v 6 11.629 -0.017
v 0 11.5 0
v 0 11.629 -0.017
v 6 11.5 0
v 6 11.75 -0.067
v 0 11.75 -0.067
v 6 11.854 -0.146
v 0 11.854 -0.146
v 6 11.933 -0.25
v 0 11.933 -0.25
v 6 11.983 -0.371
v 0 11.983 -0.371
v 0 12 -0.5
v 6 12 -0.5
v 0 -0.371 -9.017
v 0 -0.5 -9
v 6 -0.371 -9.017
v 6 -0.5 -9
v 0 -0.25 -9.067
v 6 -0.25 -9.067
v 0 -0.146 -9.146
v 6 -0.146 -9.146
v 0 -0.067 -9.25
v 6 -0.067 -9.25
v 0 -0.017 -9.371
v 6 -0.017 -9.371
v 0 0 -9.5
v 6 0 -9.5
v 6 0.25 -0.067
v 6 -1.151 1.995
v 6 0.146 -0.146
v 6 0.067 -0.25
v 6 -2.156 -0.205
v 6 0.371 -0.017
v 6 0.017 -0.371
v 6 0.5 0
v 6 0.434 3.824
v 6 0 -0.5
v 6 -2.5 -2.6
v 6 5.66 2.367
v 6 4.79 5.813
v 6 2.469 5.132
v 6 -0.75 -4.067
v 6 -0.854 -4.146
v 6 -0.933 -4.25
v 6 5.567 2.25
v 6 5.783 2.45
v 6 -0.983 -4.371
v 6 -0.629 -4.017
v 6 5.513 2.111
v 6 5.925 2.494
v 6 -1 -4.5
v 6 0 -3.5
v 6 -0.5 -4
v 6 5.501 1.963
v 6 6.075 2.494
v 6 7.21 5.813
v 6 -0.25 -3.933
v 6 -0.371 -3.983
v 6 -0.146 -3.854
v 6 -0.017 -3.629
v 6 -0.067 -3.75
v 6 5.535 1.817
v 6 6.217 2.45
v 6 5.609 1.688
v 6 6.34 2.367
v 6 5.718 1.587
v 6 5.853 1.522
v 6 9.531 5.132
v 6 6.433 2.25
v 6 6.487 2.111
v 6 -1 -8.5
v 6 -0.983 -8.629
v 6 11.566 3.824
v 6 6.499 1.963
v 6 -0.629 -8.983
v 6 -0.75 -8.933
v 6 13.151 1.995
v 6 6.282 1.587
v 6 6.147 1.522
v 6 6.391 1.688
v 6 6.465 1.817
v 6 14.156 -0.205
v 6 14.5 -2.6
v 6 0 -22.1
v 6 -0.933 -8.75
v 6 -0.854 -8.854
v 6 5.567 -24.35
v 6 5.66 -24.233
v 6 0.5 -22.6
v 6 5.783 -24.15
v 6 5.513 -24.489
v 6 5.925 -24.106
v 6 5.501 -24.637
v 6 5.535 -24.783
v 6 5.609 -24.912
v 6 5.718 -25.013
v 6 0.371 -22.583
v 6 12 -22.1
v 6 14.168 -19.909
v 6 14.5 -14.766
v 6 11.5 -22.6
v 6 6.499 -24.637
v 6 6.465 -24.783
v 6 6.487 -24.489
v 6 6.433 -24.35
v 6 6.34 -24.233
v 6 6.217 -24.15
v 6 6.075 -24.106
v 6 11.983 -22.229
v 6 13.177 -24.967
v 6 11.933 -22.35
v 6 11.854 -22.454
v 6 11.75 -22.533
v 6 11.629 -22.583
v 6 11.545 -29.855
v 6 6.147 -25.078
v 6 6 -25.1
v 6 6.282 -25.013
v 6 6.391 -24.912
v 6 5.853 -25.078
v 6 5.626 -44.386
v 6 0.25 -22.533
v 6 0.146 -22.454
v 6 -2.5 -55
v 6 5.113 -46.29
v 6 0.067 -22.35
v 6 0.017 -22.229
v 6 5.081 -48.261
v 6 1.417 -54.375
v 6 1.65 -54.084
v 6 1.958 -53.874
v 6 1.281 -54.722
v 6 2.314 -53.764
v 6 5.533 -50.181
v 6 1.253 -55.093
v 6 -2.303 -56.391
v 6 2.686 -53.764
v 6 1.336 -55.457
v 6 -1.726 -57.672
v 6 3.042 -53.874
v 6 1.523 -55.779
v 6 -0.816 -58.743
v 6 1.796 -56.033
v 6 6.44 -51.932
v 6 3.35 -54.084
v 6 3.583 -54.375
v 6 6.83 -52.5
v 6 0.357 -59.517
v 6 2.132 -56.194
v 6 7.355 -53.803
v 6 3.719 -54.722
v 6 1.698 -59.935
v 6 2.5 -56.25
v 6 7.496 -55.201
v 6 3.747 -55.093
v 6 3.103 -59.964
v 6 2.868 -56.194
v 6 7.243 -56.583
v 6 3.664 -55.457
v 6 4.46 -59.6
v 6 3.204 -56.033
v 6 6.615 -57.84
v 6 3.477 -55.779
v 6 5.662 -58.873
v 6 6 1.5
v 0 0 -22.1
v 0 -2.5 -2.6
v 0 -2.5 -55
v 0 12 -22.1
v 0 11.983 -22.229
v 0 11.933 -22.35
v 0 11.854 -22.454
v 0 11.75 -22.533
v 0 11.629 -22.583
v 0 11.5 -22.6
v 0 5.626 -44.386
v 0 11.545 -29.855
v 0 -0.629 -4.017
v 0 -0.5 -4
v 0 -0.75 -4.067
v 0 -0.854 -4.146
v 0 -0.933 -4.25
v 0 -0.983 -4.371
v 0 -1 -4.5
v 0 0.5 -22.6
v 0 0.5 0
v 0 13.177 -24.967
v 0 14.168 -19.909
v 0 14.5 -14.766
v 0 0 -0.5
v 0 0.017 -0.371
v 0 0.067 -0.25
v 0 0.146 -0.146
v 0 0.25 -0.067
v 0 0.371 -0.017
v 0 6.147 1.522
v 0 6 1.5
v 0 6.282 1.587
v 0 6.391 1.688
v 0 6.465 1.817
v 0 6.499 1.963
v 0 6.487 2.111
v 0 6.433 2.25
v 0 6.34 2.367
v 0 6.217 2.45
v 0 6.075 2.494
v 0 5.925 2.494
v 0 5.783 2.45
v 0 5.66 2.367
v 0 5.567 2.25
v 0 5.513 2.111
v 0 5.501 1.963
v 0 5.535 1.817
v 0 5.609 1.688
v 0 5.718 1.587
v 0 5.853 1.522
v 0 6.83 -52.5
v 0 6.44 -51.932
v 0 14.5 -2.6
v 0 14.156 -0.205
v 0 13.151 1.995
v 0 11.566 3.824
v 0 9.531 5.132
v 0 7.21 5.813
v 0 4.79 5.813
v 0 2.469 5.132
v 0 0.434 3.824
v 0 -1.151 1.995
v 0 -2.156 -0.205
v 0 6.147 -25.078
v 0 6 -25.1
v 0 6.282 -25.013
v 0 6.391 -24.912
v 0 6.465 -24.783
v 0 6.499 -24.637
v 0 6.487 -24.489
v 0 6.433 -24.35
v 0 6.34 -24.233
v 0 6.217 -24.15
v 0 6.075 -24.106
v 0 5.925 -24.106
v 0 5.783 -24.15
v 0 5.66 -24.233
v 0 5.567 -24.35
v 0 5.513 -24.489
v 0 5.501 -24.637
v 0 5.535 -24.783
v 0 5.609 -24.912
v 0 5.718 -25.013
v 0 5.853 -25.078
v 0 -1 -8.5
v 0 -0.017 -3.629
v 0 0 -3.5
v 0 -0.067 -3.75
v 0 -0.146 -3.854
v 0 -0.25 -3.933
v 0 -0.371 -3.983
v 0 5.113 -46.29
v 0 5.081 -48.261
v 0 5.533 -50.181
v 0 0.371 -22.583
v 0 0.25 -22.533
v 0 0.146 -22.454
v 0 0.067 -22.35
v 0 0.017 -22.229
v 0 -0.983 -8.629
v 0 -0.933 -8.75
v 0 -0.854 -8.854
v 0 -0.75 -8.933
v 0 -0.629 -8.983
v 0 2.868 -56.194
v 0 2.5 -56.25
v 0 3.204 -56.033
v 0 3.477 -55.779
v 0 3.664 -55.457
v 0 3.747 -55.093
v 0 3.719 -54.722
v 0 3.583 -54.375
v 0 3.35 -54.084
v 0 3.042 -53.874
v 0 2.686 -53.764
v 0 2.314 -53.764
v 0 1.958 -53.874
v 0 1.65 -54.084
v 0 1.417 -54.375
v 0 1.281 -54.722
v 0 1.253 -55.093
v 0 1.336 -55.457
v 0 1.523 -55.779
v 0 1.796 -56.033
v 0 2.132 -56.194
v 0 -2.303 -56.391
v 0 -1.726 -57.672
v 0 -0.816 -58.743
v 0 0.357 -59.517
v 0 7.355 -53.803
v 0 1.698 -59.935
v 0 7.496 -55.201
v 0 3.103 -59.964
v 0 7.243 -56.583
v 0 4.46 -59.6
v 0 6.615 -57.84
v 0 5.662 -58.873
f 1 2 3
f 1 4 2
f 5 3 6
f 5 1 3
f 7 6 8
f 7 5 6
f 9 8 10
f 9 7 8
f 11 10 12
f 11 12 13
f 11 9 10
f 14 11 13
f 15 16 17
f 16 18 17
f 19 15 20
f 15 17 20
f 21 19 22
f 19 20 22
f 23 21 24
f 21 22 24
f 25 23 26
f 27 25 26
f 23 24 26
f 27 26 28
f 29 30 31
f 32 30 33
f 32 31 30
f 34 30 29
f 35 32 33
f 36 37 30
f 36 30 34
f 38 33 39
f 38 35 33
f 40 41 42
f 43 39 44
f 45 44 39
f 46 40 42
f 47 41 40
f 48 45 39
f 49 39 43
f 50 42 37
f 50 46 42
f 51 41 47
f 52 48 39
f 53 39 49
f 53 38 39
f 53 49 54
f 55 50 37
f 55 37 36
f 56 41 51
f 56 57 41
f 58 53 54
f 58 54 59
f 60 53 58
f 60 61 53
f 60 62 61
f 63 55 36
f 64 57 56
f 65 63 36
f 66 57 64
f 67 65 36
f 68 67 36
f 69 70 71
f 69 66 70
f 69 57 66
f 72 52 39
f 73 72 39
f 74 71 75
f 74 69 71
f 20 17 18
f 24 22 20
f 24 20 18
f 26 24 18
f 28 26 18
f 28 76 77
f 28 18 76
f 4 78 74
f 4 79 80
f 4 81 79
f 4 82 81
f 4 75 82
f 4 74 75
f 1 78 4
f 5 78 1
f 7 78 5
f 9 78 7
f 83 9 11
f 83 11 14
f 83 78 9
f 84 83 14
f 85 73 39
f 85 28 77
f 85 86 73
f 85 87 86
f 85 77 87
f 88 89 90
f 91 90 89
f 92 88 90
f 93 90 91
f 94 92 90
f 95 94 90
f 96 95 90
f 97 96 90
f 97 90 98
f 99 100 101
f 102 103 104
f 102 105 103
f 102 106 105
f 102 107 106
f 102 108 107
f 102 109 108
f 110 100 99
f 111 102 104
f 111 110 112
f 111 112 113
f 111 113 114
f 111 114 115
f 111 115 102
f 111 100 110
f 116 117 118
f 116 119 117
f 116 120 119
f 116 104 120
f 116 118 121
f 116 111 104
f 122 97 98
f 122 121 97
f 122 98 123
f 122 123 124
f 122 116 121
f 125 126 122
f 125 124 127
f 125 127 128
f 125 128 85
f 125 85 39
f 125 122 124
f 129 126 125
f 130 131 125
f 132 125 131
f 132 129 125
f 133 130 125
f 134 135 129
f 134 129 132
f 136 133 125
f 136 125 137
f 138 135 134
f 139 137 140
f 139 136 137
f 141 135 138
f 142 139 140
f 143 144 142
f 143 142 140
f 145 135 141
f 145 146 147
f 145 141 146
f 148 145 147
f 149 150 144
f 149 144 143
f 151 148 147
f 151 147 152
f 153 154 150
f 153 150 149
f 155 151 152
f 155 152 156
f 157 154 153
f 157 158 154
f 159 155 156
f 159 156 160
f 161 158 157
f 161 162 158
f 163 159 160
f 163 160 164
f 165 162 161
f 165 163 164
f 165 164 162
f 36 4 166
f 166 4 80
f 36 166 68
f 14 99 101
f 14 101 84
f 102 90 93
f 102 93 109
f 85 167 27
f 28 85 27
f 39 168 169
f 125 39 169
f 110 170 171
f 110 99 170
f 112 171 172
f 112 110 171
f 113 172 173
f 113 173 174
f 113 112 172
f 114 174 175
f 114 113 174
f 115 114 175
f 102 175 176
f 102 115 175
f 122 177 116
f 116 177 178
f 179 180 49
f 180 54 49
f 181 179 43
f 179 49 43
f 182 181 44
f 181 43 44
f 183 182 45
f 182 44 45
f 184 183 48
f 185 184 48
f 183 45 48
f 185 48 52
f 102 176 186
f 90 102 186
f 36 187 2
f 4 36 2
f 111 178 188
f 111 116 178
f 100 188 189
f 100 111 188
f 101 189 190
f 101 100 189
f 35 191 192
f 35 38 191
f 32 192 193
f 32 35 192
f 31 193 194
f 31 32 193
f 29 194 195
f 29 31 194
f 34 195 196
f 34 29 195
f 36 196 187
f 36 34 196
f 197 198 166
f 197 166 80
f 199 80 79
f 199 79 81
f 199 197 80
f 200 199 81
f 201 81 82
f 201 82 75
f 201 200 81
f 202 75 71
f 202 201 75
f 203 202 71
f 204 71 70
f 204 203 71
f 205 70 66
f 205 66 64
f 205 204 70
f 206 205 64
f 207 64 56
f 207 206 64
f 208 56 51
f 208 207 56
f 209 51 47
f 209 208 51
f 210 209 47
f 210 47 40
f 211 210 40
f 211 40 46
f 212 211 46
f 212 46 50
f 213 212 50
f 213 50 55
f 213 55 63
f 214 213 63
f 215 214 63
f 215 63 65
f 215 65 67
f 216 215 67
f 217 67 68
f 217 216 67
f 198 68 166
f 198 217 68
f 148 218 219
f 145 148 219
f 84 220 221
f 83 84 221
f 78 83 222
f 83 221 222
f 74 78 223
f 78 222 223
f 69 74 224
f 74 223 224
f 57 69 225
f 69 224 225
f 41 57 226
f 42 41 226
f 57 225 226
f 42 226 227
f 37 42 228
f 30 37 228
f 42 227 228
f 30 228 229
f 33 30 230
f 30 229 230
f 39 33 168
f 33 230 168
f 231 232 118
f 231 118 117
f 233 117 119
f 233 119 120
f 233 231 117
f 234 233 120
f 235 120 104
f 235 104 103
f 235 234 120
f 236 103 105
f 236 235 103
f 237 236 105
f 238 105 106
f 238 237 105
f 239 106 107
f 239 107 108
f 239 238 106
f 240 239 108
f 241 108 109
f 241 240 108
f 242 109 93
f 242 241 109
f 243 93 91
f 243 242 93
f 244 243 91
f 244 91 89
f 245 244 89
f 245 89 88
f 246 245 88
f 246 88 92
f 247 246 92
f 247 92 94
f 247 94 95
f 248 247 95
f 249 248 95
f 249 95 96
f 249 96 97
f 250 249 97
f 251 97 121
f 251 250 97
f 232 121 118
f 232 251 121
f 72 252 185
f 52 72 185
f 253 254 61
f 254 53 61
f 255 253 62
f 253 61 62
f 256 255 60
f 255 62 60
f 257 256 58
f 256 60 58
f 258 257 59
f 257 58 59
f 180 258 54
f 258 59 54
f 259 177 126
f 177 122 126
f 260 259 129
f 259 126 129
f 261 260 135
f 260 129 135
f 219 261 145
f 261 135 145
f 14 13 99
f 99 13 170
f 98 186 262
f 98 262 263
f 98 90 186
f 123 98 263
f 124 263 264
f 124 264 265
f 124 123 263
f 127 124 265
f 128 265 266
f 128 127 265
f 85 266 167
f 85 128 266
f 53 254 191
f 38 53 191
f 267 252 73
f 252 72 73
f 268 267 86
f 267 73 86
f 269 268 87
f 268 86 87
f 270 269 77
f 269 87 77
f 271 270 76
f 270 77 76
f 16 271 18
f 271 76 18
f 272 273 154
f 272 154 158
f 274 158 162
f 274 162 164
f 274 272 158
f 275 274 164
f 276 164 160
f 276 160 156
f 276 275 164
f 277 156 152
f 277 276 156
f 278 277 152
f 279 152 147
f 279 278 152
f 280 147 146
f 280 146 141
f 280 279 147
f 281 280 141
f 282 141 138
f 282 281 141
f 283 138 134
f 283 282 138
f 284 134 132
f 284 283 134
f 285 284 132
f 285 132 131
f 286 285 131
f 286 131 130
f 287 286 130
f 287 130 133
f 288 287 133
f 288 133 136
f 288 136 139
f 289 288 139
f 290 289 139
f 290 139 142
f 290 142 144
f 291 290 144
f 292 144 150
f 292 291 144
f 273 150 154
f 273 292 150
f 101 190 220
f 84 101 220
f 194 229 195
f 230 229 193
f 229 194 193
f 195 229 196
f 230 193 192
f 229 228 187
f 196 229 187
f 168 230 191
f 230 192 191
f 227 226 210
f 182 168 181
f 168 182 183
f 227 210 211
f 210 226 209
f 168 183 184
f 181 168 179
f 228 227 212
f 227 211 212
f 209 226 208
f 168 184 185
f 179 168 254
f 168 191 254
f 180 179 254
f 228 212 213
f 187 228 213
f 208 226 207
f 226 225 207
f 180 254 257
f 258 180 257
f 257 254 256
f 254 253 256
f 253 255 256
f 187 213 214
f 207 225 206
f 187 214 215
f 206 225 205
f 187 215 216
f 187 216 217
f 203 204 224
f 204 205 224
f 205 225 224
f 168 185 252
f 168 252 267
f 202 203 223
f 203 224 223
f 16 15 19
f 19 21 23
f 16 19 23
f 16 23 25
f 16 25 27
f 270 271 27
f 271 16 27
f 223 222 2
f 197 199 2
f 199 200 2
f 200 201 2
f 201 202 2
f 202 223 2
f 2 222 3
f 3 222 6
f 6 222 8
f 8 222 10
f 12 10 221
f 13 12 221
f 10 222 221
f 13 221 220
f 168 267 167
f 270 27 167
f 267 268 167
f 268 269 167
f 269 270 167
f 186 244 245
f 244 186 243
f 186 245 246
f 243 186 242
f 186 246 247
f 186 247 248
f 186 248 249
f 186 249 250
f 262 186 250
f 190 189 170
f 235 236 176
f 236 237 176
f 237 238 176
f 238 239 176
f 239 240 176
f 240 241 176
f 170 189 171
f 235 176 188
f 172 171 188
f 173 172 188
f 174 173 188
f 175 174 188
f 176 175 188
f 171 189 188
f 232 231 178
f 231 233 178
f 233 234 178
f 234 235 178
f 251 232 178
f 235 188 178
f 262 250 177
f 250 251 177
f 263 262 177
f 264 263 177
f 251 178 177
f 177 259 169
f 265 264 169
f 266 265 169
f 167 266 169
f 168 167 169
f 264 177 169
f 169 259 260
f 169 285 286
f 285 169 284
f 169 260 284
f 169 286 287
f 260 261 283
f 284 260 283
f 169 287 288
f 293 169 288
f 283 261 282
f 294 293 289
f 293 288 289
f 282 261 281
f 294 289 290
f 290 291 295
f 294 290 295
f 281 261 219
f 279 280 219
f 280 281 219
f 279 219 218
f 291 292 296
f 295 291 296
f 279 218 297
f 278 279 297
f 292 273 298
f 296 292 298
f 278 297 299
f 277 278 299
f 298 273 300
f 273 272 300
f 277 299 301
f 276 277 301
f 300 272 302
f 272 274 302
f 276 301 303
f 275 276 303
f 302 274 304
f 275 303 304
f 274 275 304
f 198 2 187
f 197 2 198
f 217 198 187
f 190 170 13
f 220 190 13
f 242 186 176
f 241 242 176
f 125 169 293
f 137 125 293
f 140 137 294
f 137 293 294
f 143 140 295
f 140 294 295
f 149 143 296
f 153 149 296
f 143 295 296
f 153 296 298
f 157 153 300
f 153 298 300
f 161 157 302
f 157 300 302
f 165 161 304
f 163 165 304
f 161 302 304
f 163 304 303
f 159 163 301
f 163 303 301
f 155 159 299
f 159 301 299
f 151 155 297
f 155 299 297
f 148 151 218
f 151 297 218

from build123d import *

# Parameters (mm, degrees)
SCHIZZO1_R                   = 0.5
SCHIZZO1_R_2                 = 1.25
ESTRUSIONE_ESTRUSIONE1_DEPTH = 6
RACCORDO1_R                  = 8
RACCORDO2_R                  = 40
RACCORDO3_R                  = 0.5


with BuildPart() as part:
    # Schizzo1 → Estrusione-Estrusione1 (new body)
    with BuildSketch(Plane(origin=(0, 0, 0), x_dir=(0, 0, -1), z_dir=(1, 0, 0))):
        with BuildLine():
            Line((22.6, 14.5), (2.6, 14.5))
            ThreePointArc((2.6, 14.5), (-5.9, 6), (2.6, -2.5))
            Line((2.6, -2.5), (55, -2.5))
            ThreePointArc((55, -2.5), (59.829629131, 3.794095226), (52.5, 6.830127019))
            Line((52.5, 6.830127019), (48.378061008, 4))
            Line((48.378061008, 4), (22.6, 14.5))
        make_face()
        Polygon((0, 0), (0, 12), (22.6, 12), (22.6, 0), (9, 0), (9, -1), (4, -1), (4, 0), align=None, mode=Mode.SUBTRACT)
        with Locations((-2, 6)):
            Circle(SCHIZZO1_R, mode=Mode.SUBTRACT)
        with Locations((24.6, 6)):
            Circle(SCHIZZO1_R, mode=Mode.SUBTRACT)
        with Locations((55, 2.5)):
            Circle(SCHIZZO1_R_2, mode=Mode.SUBTRACT)
    extrude(amount=ESTRUSIONE_ESTRUSIONE1_DEPTH)

    # Raccordo1
    raccordo1_edges = [part.edges().sort_by_distance(p)[0] for p in [
        (3, 4, -48.378061008),
    ]]
    fillet(raccordo1_edges, radius=RACCORDO1_R)

    # Raccordo2
    raccordo2_edges = [part.edges().sort_by_distance(p)[0] for p in [
        (3, 14.5, -22.6),
    ]]
    fillet(raccordo2_edges, radius=RACCORDO2_R)

    # Raccordo3
    raccordo3_edges = [part.edges().sort_by_distance(p)[0] for p in [
        (3, 0, -22.6),
        (3, 0, 0),
        (3, 12, 0),
        (3, 12, -22.6),
        (3, 0, -4),
        (3, -1, -4),
        (3, -1, -9),
        (3, 0, -9),
    ]]
    fillet(raccordo3_edges, radius=RACCORDO3_R - 0.0001)  # a hair under: the kernel refuses the full size


solid = part.part
